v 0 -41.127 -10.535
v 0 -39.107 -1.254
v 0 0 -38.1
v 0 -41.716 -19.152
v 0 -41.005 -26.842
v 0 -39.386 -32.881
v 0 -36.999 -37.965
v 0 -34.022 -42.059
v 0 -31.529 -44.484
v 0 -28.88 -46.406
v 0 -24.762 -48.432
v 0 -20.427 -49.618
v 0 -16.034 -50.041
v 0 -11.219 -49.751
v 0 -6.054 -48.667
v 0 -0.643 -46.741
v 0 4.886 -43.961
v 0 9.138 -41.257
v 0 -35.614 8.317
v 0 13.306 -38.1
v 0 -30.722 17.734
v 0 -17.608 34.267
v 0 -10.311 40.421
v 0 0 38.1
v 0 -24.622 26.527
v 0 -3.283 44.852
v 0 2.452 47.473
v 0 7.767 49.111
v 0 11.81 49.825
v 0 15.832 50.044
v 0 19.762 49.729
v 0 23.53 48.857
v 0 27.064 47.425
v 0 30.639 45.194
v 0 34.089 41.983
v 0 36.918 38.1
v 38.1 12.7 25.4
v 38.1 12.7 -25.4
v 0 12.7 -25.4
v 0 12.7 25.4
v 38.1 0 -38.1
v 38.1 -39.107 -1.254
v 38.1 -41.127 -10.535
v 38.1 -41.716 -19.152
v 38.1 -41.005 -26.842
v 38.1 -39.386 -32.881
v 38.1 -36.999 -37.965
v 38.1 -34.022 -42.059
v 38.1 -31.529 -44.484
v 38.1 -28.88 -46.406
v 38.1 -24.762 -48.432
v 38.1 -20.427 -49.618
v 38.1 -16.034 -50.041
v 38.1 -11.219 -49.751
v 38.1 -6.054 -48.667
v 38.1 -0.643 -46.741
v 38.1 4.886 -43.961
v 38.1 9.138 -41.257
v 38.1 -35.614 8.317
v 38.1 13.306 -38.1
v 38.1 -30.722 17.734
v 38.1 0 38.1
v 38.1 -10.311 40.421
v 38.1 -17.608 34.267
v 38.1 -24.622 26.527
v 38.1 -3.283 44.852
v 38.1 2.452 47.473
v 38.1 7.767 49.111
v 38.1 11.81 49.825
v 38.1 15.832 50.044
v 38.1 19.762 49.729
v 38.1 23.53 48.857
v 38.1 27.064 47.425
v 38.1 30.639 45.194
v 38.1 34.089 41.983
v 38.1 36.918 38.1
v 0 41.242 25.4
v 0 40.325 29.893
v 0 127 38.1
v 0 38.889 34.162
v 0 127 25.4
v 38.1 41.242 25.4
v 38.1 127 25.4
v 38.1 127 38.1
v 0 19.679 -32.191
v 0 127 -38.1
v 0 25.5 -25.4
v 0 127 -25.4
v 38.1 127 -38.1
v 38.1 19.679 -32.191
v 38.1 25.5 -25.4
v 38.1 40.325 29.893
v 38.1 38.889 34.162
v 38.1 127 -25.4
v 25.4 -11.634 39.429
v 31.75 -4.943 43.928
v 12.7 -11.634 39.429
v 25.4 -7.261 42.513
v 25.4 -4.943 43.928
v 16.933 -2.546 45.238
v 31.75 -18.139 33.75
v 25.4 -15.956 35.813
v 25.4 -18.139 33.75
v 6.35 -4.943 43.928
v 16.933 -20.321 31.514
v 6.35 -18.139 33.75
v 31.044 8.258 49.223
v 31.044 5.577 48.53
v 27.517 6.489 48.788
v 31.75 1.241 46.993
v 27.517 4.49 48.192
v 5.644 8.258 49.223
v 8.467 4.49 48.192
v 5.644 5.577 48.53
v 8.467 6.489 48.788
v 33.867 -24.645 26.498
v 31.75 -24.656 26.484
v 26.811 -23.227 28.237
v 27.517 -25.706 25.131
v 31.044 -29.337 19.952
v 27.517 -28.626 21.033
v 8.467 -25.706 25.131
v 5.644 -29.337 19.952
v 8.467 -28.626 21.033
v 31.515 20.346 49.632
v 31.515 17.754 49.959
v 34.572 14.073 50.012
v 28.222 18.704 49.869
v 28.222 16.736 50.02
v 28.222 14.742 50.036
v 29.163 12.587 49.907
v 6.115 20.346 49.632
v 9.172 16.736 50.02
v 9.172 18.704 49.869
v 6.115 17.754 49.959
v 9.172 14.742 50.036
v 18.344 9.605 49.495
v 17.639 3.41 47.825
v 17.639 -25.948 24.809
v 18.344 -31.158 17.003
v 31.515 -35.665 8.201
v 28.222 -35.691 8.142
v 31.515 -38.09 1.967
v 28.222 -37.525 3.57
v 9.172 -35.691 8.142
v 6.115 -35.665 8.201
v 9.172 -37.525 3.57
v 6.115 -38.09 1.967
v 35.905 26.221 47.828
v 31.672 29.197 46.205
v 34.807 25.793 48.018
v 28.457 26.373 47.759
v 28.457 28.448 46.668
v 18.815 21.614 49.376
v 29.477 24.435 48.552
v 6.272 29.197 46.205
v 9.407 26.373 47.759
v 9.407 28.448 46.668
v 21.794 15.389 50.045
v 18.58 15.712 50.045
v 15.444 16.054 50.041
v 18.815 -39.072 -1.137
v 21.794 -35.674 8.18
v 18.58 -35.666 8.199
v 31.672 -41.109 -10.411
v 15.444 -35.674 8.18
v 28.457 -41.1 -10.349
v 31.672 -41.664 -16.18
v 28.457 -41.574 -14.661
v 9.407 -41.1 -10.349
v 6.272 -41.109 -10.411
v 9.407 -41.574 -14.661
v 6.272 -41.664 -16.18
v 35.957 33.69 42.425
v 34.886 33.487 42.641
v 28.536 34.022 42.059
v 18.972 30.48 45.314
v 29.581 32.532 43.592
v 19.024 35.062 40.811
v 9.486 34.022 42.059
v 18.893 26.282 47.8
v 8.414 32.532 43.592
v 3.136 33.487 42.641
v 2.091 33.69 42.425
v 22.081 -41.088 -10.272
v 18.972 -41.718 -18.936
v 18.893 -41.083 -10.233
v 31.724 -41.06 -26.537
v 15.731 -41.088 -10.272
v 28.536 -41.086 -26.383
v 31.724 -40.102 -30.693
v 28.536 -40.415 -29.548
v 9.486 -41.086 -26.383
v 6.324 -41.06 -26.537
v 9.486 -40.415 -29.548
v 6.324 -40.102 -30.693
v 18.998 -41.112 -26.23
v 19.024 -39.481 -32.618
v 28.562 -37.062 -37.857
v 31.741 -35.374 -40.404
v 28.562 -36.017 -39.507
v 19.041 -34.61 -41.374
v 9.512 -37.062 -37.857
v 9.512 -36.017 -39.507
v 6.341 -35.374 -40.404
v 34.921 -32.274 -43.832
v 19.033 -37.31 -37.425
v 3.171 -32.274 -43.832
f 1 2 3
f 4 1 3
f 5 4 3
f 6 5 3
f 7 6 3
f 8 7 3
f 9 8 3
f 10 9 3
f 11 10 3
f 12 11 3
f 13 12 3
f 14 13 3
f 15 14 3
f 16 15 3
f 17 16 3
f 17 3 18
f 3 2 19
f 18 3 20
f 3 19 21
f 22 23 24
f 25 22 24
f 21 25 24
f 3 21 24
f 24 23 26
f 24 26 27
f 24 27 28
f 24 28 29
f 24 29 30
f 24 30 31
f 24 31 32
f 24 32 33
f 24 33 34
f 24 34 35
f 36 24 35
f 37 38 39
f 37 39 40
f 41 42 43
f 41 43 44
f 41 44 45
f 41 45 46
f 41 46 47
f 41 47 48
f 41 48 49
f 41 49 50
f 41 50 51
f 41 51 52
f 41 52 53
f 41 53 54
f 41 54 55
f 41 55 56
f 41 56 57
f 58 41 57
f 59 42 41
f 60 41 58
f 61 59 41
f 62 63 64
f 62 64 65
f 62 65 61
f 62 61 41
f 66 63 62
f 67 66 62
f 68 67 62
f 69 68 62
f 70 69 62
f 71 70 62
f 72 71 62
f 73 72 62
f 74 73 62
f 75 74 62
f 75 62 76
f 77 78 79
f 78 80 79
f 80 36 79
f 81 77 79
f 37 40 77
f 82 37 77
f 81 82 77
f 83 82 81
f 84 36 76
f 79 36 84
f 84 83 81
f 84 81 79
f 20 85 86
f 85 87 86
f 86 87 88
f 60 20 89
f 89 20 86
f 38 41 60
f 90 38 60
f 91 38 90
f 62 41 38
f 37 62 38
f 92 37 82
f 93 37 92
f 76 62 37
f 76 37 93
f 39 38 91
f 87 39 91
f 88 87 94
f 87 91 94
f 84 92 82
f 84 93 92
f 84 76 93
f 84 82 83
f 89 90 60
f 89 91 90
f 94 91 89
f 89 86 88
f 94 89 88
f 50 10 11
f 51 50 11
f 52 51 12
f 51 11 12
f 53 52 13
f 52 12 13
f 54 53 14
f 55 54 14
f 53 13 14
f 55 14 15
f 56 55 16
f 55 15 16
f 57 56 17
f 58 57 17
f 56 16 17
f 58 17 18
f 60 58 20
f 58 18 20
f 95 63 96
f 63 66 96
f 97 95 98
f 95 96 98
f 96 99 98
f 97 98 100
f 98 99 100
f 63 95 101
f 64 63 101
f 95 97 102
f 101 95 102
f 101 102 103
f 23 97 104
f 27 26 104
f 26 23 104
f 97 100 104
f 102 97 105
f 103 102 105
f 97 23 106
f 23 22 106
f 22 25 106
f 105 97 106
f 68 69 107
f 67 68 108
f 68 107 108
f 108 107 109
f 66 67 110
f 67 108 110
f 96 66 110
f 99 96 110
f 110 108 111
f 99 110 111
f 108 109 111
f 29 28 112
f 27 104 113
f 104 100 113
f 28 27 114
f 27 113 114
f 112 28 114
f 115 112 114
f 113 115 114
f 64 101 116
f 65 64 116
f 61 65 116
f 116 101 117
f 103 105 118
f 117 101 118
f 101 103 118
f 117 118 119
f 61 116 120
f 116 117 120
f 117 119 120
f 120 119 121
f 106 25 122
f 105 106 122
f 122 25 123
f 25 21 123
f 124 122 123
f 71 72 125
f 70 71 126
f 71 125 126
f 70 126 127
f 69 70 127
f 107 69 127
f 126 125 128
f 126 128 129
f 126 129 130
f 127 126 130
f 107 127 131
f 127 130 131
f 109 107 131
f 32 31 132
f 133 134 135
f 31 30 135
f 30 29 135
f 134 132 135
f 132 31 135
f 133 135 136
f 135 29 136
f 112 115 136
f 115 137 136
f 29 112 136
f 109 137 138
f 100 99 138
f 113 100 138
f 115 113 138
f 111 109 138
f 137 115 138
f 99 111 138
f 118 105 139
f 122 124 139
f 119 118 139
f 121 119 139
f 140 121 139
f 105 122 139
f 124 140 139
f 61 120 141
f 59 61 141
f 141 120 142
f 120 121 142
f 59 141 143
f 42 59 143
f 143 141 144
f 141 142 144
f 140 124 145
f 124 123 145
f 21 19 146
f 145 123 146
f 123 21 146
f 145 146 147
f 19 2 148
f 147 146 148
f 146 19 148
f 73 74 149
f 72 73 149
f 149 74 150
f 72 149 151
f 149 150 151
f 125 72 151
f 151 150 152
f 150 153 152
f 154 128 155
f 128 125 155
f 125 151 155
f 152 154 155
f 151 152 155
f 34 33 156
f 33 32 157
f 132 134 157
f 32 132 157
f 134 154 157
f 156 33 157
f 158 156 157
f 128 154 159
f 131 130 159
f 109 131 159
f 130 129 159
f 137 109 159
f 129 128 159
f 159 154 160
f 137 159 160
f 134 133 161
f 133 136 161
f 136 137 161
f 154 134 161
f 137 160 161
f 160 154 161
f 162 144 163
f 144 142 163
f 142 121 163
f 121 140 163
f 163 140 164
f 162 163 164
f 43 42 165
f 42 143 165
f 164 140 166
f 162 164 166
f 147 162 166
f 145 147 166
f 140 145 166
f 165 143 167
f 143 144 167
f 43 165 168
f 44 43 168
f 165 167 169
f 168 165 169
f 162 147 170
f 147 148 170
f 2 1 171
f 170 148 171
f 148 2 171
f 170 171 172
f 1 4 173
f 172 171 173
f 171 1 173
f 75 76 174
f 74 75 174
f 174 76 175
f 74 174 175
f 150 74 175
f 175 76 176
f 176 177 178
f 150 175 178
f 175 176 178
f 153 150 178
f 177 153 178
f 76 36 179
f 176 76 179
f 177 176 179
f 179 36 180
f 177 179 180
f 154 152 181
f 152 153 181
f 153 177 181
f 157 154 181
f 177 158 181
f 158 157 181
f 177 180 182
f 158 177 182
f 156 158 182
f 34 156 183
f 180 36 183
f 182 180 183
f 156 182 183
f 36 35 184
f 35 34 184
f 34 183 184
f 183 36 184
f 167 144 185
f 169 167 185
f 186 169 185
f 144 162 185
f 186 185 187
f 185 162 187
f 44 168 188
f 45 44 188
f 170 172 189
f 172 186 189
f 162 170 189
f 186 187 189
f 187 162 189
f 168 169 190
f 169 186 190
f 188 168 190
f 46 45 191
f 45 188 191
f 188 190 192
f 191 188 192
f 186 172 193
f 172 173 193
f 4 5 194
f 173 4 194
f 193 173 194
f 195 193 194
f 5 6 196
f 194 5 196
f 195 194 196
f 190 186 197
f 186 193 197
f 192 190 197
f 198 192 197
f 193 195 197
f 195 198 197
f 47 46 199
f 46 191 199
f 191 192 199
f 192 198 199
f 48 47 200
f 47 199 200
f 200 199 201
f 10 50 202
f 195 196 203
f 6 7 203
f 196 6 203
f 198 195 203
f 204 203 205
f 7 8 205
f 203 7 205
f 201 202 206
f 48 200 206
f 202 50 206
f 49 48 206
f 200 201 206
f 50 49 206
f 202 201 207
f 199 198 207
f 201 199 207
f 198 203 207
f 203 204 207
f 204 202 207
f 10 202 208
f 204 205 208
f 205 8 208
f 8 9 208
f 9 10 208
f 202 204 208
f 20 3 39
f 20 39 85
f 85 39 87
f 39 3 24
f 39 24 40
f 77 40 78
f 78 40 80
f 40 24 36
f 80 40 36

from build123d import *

# Parameters (mm, degrees)
F0_W     = 127
F0_H     = 76.2
F1_DEPTH = 38.1
F5_DEPTH = 38.1
F3_W     = 114.3
F3_H     = 50.8
F6_DEPTH = 38.1010001


with BuildPart() as f1:
    # F0 (on Right) → F1 (new body)
    with BuildSketch(Plane.YZ):
        with Locations((63.5, 0)):
            Rectangle(F0_W, F0_H)
    extrude(amount=F1_DEPTH)

    # F4 (on Right) → F5 (join, through all)
    with BuildSketch(Plane.YZ):
        with BuildLine():
            add(Edge.make_bspline(
                [(-28.8798008114, -46.4058034122), (23.2675885804, -78.8587749747), (40.5135951016, 6.9764159249), (57.7596016228, 92.8116068244), (-11.6337942902, 39.4293874873), (-81.0271902032, -13.9528318497), (-28.8798008114, -46.4058034122)],
                knots=[0, 0, 0, 2.0943951024, 2.0943951024, 4.1887902048, 4.1887902048, 6.2831853072, 6.2831853072, 6.2831853072], degree=2, weights=[1, 0.5, 1, 0.5, 1, 0.5, 1]))
        make_face()
    extrude(amount=F5_DEPTH)

    # F3 (on face) → F6 (cut, through all)
    with BuildSketch(Plane.YZ.offset(38.1)):
        with Locations((69.85, 0)):
            Rectangle(F3_W, F3_H)
    extrude(amount=-F6_DEPTH, mode=Mode.SUBTRACT)


solid = f1.part
